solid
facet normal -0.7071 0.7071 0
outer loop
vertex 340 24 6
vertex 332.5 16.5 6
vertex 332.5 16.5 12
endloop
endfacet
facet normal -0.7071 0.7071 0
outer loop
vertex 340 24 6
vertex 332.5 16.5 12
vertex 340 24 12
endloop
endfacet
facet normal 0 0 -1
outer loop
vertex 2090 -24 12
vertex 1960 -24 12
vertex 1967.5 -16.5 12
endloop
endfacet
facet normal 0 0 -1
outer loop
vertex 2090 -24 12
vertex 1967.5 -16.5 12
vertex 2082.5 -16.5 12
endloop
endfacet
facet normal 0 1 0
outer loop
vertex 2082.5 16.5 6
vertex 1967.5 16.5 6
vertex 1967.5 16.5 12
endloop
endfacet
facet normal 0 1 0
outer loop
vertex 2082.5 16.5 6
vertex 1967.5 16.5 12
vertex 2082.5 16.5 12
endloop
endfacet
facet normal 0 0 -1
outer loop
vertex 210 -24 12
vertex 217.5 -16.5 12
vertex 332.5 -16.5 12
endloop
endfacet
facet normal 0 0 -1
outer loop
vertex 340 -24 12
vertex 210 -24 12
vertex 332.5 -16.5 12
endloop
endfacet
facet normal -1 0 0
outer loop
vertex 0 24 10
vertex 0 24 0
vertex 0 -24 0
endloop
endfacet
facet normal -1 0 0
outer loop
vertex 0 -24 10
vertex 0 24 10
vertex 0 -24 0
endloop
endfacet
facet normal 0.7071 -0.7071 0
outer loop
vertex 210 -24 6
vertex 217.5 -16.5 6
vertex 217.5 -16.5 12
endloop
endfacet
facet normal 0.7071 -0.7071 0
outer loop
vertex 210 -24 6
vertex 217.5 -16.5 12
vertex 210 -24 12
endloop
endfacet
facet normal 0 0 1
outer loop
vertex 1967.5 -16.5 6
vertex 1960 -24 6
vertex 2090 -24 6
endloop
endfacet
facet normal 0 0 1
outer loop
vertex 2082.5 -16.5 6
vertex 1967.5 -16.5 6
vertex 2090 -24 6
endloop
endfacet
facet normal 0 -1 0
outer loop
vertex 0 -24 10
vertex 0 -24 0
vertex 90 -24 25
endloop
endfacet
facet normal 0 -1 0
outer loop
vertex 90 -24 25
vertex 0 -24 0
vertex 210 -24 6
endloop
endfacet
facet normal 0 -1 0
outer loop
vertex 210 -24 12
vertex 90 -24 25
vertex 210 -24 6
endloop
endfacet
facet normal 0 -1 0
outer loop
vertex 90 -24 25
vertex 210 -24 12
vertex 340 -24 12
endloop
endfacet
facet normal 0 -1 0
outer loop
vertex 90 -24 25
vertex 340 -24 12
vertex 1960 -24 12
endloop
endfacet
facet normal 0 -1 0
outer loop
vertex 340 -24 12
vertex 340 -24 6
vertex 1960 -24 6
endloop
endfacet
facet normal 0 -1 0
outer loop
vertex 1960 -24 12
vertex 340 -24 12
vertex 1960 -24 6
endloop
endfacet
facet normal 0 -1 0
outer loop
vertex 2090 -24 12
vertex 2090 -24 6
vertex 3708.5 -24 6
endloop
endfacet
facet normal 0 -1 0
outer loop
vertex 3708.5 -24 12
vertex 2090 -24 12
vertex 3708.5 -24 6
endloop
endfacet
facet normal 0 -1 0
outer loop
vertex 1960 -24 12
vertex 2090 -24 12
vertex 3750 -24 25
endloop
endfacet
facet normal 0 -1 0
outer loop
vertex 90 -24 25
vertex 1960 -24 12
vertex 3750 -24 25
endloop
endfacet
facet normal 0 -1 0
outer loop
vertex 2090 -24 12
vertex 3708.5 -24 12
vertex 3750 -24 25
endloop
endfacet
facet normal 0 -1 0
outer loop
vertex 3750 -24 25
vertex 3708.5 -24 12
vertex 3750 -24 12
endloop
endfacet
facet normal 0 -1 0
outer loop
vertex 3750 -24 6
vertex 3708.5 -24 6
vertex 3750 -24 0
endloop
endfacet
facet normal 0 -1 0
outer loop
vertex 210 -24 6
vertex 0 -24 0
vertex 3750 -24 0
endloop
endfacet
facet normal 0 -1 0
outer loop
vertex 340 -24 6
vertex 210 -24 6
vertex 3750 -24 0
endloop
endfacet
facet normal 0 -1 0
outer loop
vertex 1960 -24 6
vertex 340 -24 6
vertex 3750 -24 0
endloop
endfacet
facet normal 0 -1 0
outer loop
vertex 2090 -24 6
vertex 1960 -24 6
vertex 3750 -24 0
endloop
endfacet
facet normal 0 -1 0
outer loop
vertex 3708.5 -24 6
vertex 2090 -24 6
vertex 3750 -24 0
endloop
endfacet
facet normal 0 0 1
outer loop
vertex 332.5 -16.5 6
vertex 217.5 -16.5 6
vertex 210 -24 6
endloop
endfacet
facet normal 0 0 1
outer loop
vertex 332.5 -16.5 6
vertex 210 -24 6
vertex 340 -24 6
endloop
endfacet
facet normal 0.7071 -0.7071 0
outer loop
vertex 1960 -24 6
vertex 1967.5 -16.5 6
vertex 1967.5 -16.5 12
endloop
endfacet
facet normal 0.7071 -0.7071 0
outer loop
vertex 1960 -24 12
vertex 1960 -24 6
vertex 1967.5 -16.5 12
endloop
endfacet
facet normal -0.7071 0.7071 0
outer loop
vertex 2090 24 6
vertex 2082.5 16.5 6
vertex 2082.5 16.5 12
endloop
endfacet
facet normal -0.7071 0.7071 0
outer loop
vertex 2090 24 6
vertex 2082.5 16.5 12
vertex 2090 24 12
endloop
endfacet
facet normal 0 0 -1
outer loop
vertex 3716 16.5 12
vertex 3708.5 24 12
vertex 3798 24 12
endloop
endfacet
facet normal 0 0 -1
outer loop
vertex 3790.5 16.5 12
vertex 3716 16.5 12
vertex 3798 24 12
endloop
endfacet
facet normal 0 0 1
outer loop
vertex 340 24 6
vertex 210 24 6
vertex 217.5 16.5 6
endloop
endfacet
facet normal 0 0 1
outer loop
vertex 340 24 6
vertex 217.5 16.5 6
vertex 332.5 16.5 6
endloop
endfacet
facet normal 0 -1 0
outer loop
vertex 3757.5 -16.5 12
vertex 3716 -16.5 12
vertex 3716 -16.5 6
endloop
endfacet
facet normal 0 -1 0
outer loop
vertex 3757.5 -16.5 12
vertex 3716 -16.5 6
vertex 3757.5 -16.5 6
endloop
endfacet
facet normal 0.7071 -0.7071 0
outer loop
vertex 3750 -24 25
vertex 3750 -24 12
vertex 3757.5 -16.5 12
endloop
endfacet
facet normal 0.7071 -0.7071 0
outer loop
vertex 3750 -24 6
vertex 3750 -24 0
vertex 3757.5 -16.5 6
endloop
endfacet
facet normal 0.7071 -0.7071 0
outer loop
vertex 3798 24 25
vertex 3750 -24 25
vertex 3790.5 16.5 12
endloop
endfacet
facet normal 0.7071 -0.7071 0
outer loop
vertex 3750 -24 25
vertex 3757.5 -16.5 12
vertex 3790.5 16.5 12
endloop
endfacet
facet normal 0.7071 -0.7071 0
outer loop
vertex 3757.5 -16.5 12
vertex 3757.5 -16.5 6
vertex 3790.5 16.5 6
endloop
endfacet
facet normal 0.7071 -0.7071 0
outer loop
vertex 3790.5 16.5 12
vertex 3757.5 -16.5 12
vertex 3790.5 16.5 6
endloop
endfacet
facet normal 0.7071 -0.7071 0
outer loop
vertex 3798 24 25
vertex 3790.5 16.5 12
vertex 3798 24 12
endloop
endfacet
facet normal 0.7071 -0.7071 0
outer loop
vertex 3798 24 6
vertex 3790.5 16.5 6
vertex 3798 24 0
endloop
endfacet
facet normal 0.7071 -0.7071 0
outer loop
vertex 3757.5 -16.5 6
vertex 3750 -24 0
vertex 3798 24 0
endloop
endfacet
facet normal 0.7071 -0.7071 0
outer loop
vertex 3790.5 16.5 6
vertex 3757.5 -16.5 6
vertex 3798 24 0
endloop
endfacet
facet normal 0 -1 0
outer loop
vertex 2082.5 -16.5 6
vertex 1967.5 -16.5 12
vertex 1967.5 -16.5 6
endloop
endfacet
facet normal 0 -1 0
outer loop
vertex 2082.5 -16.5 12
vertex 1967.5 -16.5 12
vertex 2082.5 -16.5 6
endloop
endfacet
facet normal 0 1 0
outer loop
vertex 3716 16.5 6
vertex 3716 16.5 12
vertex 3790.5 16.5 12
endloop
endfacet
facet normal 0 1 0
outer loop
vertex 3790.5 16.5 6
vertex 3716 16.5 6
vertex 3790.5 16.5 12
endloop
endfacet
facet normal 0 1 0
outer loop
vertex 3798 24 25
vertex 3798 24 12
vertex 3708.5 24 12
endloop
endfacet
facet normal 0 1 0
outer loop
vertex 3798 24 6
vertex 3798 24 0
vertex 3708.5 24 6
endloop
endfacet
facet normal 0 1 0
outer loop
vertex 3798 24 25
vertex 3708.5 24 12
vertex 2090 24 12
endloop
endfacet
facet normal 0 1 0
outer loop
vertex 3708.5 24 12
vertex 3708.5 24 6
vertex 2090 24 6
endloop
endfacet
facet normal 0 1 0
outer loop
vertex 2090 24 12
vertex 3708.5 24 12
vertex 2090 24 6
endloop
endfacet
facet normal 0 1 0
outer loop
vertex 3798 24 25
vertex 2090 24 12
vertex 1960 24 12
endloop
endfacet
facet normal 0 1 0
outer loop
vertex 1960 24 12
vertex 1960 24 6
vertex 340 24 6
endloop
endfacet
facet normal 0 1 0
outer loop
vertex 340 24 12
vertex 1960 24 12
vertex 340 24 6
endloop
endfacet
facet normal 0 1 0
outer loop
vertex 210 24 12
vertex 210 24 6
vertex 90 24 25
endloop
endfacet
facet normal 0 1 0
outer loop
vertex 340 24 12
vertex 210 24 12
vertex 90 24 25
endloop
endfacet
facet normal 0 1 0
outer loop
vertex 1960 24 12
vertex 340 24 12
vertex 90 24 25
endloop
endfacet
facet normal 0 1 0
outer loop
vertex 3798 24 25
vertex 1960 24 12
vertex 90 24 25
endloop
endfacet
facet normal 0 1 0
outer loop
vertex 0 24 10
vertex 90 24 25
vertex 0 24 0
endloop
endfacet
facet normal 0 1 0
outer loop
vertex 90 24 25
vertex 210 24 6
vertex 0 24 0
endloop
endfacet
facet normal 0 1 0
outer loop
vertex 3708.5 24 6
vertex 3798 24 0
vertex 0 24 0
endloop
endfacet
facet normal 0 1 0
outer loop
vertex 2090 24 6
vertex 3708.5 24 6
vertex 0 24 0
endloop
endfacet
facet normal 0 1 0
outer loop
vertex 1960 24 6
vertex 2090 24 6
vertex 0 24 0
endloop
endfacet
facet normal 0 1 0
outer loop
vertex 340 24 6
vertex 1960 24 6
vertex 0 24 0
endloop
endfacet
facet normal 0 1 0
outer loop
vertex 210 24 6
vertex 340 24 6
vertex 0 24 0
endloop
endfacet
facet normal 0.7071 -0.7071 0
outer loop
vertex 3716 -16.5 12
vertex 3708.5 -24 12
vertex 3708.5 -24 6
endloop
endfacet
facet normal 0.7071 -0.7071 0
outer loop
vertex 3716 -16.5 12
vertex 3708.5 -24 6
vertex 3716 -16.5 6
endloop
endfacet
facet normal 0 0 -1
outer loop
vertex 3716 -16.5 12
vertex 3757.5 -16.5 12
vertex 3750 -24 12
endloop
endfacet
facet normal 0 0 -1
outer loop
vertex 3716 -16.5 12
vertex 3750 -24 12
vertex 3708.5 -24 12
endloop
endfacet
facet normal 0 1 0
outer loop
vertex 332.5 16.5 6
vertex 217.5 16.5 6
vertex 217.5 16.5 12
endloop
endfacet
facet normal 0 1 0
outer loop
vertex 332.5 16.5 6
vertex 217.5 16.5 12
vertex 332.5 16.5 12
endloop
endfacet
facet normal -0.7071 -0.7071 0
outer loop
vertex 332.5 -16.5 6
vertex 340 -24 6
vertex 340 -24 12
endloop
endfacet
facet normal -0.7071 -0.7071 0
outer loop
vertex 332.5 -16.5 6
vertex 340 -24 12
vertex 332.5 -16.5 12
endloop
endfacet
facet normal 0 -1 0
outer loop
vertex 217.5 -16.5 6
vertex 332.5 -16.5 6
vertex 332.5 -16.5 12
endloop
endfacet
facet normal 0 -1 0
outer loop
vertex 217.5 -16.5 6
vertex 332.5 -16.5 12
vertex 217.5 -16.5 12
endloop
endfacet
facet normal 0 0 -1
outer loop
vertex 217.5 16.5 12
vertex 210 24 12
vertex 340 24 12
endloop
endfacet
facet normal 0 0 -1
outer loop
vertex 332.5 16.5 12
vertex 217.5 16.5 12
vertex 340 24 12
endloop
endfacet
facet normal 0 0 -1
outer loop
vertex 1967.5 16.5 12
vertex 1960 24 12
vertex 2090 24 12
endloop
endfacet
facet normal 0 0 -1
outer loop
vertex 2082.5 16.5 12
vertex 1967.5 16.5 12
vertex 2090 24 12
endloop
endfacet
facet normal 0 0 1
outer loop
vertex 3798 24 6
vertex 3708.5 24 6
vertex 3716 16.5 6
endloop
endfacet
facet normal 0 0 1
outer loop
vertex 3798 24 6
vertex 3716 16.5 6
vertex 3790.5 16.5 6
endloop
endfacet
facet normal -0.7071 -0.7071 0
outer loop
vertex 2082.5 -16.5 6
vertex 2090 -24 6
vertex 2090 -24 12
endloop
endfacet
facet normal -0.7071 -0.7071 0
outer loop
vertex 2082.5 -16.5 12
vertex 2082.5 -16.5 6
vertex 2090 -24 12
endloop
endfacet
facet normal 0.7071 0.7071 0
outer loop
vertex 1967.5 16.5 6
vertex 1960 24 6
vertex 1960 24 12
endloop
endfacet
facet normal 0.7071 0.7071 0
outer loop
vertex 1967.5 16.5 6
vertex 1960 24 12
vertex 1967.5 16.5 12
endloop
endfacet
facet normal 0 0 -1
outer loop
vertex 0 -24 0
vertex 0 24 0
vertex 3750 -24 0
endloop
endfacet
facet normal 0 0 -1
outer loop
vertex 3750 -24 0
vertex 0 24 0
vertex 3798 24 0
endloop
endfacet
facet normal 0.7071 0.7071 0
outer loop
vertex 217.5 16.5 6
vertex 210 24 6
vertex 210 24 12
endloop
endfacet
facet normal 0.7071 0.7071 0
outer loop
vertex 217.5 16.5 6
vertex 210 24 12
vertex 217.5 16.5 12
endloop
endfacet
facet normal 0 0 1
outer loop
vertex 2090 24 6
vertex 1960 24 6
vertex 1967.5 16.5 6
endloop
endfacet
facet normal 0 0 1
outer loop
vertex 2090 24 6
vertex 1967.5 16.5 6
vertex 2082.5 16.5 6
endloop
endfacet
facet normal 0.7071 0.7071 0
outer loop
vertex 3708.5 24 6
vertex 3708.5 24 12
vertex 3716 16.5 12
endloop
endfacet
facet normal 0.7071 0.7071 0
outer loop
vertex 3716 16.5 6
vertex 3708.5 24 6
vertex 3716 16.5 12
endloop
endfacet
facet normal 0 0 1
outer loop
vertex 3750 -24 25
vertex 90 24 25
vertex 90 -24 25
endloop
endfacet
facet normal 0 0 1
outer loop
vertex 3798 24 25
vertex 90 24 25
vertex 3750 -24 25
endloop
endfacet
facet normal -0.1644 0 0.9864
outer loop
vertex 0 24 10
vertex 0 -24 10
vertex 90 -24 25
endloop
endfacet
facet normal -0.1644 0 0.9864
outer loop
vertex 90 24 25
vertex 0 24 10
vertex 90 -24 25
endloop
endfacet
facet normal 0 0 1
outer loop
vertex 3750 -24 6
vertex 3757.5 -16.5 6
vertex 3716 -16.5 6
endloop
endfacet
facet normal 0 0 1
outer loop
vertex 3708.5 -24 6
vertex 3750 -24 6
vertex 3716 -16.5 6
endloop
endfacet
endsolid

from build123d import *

# Parameters (mm, degrees)
EXTRUDE_1_DEPTH        = 25
SKETCH_2_W             = 115
SKETCH_2_H             = 6
CUT_EXTRUDE_1_DEPTH    = 7.5
DRAFT_1_ANGLE          = 45
MIRROR_START           = 6
MIRROR_1_DEPTH         = 6
PATTERN_START          = 6
PATTERN_LINEAR_1_DEPTH = 6
CUT_EXTRUDE_START      = -13
CUT_EXTRUDE_3_DEPTH    = 6
CUT_EXTRUDE_4_REACH    = 3800.386


# Read off the part's stored shape, not the designer's step: 镜向1, 阵列(线性)1
with BuildPart() as part:
    # 草图1 → 凸台-拉伸1 (new body)
    with BuildSketch(Plane.XY):
        Polygon((0, 24), (0, -24), (3750, -24), (3798, 24), align=None)
    extrude(amount=EXTRUDE_1_DEPTH)

    # 草图2 → 切除-拉伸1 (cut)
    with BuildSketch(Plane.XZ.offset(24)):
        with Locations((2025, 9)):
            Rectangle(SKETCH_2_W, SKETCH_2_H)
    extrude(amount=-CUT_EXTRUDE_1_DEPTH, mode=Mode.SUBTRACT)

    # 拔模1
    draft_1_faces = [part.faces().sort_by_distance(p)[0] for p in [
        (2082.5, -20.25, 9),
        (1967.5, -20.25, 9),
    ]]
    draft(draft_1_faces, Plane(origin=(0, -16.5, 0), x_dir=(0, 0, -1), z_dir=(0, -1, 0)), DRAFT_1_ANGLE)

    # 镜向1 outline → 镜向1 (cut)
    with BuildSketch(Plane.XY.offset(MIRROR_START)):
        Polygon((2082.5, 16.5), (2090, 24), (1960, 24), (1967.5, 16.5), align=None)
    extrude(amount=MIRROR_1_DEPTH, mode=Mode.SUBTRACT)

    # 阵列(线性)1 outline → 阵列(线性)1 (cut)
    with BuildSketch(Plane.XY.offset(PATTERN_START)):
        Polygon((332.5, 16.5), (340, 24), (210, 24), (217.5, 16.5), align=None)
        Polygon((340, -24), (332.5, -16.5), (217.5, -16.5), (210, -24), align=None)
    extrude(amount=PATTERN_LINEAR_1_DEPTH, mode=Mode.SUBTRACT)

    # 草图4 → 切除-拉伸3 (cut)
    with BuildSketch(Plane.XY.offset(25).offset(CUT_EXTRUDE_START)):
        Polygon((3708.5, 24), (3716, 16.5), (3790.5, 16.5), (3798, 24), align=None)
        Polygon((3708.5, -24), (3716, -16.5), (3757.5, -16.5), (3750, -24), align=None)
    extrude(amount=-CUT_EXTRUDE_3_DEPTH, mode=Mode.SUBTRACT)

    # 草图5 → 切除-拉伸4 (cut, up to next)
    with BuildSketch(Plane.XZ.offset(24), mode=Mode.PRIVATE) as cut_extrude_4_sk1:
        Polygon((0, 10), (90, 25), (0, 25), align=None)
    cut_extrude_4_tool1 = extrude(cut_extrude_4_sk1.sketch, amount=-CUT_EXTRUDE_4_REACH, mode=Mode.PRIVATE) & part.part
    add(cut_extrude_4_tool1.solids().sort_by_distance((30, -24, 20))[0], mode=Mode.SUBTRACT)


solid = part.part
